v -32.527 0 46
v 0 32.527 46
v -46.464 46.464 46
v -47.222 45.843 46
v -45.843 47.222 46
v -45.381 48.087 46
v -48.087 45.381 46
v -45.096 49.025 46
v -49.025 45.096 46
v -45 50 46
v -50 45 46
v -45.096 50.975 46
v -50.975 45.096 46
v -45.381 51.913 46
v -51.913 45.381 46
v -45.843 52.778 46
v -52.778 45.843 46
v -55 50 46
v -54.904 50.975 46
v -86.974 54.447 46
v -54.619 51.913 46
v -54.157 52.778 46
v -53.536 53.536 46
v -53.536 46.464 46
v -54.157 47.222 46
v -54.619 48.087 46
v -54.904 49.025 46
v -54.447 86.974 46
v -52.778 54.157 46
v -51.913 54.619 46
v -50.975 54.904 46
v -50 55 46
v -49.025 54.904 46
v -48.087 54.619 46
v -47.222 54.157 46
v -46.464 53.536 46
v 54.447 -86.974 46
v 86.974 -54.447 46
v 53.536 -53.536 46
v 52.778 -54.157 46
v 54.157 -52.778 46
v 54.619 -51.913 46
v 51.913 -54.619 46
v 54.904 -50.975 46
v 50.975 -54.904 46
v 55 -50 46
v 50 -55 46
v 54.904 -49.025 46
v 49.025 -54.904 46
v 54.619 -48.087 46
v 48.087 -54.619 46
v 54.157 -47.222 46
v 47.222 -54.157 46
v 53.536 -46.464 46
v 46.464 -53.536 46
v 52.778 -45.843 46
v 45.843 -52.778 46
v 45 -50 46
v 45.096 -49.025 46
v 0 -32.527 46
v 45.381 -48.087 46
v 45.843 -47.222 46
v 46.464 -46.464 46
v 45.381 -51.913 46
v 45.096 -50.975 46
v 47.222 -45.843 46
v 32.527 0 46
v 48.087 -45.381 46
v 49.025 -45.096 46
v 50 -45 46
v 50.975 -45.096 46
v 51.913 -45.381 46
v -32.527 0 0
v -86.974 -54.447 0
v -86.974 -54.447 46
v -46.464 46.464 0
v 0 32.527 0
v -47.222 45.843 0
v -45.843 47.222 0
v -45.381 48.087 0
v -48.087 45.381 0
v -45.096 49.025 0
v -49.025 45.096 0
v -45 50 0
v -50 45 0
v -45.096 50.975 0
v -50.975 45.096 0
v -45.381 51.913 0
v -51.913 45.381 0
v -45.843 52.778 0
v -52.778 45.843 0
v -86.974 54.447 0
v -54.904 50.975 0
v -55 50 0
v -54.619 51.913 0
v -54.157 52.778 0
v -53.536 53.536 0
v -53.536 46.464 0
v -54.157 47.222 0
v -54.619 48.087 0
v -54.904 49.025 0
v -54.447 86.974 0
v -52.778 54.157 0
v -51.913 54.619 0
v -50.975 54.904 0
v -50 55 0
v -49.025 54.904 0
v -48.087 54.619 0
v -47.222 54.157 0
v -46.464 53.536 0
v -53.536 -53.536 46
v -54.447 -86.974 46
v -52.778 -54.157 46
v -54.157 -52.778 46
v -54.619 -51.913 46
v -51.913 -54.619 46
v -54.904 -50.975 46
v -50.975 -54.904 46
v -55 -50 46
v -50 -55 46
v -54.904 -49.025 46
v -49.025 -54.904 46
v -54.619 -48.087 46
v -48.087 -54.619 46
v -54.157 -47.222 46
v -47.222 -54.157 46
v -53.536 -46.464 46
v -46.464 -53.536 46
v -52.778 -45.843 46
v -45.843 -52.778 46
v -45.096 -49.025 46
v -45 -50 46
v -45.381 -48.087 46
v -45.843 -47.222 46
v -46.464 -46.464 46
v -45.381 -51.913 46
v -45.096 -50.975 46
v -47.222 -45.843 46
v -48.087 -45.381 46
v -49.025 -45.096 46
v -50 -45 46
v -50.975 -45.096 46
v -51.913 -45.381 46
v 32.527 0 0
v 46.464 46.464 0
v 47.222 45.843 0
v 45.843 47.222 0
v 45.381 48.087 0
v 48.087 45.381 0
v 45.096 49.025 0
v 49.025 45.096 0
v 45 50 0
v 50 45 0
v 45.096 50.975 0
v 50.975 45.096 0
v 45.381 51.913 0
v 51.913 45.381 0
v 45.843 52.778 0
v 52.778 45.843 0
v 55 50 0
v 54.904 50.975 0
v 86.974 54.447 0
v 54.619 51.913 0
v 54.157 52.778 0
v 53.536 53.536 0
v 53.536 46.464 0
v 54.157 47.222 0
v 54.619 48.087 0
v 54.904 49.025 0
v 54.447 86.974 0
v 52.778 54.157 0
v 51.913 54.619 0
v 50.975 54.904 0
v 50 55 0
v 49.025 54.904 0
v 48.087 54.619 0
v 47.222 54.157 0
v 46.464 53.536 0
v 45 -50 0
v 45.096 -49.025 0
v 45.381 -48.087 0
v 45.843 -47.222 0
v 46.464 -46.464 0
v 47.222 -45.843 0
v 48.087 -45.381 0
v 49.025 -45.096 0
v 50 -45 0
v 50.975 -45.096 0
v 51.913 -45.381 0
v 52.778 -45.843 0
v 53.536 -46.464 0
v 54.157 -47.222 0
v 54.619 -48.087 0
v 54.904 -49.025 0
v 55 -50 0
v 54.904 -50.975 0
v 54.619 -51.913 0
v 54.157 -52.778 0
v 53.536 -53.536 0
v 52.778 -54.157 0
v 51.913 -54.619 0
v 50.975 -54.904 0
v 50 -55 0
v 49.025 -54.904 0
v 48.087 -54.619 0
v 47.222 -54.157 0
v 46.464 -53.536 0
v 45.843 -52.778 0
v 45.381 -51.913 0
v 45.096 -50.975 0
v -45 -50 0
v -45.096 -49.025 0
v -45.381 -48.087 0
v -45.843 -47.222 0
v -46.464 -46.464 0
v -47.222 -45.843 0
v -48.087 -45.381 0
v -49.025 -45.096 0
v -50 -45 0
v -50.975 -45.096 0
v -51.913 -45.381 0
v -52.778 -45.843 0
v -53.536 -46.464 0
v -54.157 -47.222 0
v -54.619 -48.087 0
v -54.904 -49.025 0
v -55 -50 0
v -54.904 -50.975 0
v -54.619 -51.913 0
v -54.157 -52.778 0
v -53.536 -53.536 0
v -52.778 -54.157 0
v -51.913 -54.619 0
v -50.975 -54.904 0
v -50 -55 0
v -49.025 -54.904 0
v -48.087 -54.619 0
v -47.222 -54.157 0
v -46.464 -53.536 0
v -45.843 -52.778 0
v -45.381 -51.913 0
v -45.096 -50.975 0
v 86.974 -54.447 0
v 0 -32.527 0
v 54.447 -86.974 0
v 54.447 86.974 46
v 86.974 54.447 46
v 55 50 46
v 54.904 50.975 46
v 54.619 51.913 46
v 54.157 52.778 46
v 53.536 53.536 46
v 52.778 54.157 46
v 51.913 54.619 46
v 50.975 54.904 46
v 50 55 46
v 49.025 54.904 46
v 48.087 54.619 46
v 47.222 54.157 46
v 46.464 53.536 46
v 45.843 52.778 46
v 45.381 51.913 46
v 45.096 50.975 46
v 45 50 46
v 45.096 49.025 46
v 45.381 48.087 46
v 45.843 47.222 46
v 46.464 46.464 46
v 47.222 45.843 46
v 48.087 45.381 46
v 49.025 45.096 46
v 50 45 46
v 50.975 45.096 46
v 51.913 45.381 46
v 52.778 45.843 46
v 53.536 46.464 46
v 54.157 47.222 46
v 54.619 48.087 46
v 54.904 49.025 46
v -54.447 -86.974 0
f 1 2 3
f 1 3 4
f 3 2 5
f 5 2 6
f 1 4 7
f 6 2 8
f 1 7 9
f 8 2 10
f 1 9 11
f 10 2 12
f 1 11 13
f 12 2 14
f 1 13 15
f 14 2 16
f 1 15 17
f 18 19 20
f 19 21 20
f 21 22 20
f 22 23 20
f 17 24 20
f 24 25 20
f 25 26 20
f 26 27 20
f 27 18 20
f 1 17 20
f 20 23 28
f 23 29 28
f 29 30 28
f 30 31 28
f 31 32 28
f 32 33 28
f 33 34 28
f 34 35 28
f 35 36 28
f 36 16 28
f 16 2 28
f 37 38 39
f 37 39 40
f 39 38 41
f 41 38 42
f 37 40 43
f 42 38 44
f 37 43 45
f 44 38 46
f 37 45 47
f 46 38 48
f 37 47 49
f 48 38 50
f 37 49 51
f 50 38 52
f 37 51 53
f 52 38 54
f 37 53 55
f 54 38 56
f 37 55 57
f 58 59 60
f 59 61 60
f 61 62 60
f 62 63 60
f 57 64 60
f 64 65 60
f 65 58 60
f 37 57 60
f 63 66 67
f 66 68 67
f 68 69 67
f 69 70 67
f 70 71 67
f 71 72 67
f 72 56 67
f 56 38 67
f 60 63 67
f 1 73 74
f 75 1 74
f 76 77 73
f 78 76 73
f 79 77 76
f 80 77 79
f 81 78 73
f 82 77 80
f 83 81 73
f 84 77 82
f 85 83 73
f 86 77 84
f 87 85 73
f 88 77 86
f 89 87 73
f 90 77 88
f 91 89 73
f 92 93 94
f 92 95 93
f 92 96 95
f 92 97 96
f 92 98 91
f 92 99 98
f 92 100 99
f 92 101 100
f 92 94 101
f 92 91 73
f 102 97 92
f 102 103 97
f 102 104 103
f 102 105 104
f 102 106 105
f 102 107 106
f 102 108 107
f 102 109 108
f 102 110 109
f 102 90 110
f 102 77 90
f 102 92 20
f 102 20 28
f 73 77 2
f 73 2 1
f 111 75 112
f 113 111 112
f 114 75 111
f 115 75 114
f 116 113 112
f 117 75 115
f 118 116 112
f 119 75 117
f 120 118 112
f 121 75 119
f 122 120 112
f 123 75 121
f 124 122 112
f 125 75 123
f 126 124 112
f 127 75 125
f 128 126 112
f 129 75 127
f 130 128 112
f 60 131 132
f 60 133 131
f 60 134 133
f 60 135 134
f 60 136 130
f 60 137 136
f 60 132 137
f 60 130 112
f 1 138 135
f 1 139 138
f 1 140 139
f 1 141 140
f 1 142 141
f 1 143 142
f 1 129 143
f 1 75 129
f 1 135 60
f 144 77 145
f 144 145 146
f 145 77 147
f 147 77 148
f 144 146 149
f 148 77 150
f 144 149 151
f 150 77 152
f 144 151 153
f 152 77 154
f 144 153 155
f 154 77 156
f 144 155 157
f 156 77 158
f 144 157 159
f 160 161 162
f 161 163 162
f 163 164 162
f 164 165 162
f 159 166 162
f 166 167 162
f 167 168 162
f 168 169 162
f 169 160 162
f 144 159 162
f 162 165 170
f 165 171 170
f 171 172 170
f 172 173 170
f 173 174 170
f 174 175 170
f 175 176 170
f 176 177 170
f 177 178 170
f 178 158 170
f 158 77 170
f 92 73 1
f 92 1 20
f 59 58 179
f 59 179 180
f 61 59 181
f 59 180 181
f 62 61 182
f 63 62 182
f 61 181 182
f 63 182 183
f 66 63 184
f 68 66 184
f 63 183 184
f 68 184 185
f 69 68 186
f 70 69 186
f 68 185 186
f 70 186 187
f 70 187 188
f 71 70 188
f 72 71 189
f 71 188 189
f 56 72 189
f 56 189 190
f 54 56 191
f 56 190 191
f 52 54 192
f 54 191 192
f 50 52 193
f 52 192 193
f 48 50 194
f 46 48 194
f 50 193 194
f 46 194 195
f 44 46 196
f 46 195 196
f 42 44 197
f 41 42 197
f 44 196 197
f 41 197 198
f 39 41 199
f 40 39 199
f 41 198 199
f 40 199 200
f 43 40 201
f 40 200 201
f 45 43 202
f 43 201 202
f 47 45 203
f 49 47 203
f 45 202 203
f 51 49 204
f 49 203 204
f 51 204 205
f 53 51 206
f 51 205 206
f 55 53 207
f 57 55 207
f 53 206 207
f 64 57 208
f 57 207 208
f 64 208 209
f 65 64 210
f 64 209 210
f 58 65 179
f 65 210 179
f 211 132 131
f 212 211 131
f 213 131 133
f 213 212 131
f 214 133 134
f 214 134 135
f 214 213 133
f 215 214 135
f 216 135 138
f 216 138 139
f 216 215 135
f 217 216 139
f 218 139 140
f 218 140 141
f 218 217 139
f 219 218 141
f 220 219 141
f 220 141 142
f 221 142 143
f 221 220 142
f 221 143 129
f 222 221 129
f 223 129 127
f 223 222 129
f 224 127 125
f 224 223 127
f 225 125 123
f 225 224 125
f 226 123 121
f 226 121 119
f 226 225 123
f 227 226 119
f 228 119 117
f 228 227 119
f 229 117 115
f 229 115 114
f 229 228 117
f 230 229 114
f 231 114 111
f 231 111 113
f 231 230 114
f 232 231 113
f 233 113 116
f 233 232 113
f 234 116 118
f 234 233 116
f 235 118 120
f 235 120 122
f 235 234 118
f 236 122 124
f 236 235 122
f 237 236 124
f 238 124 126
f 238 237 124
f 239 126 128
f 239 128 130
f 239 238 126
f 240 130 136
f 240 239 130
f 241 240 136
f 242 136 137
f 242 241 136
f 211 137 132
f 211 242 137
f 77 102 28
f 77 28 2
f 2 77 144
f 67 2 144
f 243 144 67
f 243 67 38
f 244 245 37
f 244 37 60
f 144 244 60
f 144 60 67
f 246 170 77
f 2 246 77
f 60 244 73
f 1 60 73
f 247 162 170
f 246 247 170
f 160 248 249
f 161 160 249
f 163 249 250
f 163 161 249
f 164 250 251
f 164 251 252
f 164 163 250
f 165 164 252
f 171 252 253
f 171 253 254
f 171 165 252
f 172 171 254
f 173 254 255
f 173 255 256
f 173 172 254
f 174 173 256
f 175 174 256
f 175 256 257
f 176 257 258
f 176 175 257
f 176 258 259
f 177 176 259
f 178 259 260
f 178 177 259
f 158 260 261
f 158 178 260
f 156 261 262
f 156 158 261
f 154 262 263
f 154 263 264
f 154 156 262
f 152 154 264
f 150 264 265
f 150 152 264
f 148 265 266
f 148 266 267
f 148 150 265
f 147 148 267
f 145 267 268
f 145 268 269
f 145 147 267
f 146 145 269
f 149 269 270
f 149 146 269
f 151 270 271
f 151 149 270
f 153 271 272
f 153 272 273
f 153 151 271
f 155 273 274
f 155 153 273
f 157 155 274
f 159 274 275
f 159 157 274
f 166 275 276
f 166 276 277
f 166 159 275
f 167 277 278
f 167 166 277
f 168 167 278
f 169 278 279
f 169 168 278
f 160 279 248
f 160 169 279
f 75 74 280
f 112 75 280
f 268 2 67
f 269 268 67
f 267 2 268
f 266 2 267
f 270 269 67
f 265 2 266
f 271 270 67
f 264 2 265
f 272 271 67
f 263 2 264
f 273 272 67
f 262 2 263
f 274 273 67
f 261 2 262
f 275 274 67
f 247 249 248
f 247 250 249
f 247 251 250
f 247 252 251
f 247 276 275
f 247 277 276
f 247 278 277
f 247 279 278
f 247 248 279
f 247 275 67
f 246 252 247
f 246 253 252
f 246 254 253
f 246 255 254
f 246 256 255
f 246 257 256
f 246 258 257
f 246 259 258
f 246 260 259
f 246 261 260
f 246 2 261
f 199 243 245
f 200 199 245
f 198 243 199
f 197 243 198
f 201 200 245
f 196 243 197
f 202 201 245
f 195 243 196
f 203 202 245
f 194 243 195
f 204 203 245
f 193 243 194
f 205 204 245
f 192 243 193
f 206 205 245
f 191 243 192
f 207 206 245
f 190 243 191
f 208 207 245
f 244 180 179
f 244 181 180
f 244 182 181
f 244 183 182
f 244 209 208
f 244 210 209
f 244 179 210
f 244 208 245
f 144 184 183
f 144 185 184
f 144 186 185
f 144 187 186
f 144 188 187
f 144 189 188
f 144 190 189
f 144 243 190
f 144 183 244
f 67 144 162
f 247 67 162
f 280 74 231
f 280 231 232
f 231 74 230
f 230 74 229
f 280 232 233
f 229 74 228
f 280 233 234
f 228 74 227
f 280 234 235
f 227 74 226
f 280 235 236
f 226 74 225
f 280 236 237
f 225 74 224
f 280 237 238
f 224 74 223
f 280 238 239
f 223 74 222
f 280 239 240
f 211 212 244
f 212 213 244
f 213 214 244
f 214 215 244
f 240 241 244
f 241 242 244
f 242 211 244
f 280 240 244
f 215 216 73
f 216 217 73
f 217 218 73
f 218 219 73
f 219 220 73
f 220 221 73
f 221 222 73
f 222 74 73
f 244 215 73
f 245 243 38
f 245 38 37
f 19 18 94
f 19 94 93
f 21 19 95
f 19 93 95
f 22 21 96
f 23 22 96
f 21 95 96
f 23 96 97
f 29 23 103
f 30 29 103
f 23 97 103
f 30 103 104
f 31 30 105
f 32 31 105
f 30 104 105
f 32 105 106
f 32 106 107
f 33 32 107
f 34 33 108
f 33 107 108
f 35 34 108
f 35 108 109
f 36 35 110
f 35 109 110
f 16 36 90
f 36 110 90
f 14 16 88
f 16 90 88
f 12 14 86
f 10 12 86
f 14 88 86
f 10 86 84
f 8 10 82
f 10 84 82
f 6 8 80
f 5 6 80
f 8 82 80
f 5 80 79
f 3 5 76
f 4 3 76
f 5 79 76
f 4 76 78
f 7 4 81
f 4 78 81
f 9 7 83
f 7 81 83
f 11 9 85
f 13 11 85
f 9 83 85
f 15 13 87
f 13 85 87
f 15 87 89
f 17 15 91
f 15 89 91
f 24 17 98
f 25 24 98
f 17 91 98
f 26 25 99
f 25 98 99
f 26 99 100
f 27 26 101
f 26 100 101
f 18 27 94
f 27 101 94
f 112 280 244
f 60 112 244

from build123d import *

# Parameters (mm, degrees)
F0_R     = 5
F1_DEPTH = 46


with BuildPart() as f1:
    # F0 (on Top) → F1 (new body)
    with BuildSketch(Plane.XY):
        Polygon((86.974134, 54.447222), (70.710678, 70.710678), (54.447222, 86.974134), (0, 32.526912), (16.263456, 16.263456), (32.526912, 0), align=None)
        with Locations((50, 50)):
            Circle(F0_R, mode=Mode.SUBTRACT)
        Polygon((0, -32.526912), (-16.263456, -16.263456), (-32.526912, 0), (-86.974134, -54.447222), (-70.710678, -70.710678), (-54.447222, -86.974134), align=None)
        with Locations((-50, -50)):
            Circle(F0_R, mode=Mode.SUBTRACT)
    extrude(amount=F1_DEPTH)


with BuildPart() as f2_1:
    # F2: instance of F1
    add(f1.part.mirror(Plane.YZ))


solid = Compound([f1.part, f2_1.part])
